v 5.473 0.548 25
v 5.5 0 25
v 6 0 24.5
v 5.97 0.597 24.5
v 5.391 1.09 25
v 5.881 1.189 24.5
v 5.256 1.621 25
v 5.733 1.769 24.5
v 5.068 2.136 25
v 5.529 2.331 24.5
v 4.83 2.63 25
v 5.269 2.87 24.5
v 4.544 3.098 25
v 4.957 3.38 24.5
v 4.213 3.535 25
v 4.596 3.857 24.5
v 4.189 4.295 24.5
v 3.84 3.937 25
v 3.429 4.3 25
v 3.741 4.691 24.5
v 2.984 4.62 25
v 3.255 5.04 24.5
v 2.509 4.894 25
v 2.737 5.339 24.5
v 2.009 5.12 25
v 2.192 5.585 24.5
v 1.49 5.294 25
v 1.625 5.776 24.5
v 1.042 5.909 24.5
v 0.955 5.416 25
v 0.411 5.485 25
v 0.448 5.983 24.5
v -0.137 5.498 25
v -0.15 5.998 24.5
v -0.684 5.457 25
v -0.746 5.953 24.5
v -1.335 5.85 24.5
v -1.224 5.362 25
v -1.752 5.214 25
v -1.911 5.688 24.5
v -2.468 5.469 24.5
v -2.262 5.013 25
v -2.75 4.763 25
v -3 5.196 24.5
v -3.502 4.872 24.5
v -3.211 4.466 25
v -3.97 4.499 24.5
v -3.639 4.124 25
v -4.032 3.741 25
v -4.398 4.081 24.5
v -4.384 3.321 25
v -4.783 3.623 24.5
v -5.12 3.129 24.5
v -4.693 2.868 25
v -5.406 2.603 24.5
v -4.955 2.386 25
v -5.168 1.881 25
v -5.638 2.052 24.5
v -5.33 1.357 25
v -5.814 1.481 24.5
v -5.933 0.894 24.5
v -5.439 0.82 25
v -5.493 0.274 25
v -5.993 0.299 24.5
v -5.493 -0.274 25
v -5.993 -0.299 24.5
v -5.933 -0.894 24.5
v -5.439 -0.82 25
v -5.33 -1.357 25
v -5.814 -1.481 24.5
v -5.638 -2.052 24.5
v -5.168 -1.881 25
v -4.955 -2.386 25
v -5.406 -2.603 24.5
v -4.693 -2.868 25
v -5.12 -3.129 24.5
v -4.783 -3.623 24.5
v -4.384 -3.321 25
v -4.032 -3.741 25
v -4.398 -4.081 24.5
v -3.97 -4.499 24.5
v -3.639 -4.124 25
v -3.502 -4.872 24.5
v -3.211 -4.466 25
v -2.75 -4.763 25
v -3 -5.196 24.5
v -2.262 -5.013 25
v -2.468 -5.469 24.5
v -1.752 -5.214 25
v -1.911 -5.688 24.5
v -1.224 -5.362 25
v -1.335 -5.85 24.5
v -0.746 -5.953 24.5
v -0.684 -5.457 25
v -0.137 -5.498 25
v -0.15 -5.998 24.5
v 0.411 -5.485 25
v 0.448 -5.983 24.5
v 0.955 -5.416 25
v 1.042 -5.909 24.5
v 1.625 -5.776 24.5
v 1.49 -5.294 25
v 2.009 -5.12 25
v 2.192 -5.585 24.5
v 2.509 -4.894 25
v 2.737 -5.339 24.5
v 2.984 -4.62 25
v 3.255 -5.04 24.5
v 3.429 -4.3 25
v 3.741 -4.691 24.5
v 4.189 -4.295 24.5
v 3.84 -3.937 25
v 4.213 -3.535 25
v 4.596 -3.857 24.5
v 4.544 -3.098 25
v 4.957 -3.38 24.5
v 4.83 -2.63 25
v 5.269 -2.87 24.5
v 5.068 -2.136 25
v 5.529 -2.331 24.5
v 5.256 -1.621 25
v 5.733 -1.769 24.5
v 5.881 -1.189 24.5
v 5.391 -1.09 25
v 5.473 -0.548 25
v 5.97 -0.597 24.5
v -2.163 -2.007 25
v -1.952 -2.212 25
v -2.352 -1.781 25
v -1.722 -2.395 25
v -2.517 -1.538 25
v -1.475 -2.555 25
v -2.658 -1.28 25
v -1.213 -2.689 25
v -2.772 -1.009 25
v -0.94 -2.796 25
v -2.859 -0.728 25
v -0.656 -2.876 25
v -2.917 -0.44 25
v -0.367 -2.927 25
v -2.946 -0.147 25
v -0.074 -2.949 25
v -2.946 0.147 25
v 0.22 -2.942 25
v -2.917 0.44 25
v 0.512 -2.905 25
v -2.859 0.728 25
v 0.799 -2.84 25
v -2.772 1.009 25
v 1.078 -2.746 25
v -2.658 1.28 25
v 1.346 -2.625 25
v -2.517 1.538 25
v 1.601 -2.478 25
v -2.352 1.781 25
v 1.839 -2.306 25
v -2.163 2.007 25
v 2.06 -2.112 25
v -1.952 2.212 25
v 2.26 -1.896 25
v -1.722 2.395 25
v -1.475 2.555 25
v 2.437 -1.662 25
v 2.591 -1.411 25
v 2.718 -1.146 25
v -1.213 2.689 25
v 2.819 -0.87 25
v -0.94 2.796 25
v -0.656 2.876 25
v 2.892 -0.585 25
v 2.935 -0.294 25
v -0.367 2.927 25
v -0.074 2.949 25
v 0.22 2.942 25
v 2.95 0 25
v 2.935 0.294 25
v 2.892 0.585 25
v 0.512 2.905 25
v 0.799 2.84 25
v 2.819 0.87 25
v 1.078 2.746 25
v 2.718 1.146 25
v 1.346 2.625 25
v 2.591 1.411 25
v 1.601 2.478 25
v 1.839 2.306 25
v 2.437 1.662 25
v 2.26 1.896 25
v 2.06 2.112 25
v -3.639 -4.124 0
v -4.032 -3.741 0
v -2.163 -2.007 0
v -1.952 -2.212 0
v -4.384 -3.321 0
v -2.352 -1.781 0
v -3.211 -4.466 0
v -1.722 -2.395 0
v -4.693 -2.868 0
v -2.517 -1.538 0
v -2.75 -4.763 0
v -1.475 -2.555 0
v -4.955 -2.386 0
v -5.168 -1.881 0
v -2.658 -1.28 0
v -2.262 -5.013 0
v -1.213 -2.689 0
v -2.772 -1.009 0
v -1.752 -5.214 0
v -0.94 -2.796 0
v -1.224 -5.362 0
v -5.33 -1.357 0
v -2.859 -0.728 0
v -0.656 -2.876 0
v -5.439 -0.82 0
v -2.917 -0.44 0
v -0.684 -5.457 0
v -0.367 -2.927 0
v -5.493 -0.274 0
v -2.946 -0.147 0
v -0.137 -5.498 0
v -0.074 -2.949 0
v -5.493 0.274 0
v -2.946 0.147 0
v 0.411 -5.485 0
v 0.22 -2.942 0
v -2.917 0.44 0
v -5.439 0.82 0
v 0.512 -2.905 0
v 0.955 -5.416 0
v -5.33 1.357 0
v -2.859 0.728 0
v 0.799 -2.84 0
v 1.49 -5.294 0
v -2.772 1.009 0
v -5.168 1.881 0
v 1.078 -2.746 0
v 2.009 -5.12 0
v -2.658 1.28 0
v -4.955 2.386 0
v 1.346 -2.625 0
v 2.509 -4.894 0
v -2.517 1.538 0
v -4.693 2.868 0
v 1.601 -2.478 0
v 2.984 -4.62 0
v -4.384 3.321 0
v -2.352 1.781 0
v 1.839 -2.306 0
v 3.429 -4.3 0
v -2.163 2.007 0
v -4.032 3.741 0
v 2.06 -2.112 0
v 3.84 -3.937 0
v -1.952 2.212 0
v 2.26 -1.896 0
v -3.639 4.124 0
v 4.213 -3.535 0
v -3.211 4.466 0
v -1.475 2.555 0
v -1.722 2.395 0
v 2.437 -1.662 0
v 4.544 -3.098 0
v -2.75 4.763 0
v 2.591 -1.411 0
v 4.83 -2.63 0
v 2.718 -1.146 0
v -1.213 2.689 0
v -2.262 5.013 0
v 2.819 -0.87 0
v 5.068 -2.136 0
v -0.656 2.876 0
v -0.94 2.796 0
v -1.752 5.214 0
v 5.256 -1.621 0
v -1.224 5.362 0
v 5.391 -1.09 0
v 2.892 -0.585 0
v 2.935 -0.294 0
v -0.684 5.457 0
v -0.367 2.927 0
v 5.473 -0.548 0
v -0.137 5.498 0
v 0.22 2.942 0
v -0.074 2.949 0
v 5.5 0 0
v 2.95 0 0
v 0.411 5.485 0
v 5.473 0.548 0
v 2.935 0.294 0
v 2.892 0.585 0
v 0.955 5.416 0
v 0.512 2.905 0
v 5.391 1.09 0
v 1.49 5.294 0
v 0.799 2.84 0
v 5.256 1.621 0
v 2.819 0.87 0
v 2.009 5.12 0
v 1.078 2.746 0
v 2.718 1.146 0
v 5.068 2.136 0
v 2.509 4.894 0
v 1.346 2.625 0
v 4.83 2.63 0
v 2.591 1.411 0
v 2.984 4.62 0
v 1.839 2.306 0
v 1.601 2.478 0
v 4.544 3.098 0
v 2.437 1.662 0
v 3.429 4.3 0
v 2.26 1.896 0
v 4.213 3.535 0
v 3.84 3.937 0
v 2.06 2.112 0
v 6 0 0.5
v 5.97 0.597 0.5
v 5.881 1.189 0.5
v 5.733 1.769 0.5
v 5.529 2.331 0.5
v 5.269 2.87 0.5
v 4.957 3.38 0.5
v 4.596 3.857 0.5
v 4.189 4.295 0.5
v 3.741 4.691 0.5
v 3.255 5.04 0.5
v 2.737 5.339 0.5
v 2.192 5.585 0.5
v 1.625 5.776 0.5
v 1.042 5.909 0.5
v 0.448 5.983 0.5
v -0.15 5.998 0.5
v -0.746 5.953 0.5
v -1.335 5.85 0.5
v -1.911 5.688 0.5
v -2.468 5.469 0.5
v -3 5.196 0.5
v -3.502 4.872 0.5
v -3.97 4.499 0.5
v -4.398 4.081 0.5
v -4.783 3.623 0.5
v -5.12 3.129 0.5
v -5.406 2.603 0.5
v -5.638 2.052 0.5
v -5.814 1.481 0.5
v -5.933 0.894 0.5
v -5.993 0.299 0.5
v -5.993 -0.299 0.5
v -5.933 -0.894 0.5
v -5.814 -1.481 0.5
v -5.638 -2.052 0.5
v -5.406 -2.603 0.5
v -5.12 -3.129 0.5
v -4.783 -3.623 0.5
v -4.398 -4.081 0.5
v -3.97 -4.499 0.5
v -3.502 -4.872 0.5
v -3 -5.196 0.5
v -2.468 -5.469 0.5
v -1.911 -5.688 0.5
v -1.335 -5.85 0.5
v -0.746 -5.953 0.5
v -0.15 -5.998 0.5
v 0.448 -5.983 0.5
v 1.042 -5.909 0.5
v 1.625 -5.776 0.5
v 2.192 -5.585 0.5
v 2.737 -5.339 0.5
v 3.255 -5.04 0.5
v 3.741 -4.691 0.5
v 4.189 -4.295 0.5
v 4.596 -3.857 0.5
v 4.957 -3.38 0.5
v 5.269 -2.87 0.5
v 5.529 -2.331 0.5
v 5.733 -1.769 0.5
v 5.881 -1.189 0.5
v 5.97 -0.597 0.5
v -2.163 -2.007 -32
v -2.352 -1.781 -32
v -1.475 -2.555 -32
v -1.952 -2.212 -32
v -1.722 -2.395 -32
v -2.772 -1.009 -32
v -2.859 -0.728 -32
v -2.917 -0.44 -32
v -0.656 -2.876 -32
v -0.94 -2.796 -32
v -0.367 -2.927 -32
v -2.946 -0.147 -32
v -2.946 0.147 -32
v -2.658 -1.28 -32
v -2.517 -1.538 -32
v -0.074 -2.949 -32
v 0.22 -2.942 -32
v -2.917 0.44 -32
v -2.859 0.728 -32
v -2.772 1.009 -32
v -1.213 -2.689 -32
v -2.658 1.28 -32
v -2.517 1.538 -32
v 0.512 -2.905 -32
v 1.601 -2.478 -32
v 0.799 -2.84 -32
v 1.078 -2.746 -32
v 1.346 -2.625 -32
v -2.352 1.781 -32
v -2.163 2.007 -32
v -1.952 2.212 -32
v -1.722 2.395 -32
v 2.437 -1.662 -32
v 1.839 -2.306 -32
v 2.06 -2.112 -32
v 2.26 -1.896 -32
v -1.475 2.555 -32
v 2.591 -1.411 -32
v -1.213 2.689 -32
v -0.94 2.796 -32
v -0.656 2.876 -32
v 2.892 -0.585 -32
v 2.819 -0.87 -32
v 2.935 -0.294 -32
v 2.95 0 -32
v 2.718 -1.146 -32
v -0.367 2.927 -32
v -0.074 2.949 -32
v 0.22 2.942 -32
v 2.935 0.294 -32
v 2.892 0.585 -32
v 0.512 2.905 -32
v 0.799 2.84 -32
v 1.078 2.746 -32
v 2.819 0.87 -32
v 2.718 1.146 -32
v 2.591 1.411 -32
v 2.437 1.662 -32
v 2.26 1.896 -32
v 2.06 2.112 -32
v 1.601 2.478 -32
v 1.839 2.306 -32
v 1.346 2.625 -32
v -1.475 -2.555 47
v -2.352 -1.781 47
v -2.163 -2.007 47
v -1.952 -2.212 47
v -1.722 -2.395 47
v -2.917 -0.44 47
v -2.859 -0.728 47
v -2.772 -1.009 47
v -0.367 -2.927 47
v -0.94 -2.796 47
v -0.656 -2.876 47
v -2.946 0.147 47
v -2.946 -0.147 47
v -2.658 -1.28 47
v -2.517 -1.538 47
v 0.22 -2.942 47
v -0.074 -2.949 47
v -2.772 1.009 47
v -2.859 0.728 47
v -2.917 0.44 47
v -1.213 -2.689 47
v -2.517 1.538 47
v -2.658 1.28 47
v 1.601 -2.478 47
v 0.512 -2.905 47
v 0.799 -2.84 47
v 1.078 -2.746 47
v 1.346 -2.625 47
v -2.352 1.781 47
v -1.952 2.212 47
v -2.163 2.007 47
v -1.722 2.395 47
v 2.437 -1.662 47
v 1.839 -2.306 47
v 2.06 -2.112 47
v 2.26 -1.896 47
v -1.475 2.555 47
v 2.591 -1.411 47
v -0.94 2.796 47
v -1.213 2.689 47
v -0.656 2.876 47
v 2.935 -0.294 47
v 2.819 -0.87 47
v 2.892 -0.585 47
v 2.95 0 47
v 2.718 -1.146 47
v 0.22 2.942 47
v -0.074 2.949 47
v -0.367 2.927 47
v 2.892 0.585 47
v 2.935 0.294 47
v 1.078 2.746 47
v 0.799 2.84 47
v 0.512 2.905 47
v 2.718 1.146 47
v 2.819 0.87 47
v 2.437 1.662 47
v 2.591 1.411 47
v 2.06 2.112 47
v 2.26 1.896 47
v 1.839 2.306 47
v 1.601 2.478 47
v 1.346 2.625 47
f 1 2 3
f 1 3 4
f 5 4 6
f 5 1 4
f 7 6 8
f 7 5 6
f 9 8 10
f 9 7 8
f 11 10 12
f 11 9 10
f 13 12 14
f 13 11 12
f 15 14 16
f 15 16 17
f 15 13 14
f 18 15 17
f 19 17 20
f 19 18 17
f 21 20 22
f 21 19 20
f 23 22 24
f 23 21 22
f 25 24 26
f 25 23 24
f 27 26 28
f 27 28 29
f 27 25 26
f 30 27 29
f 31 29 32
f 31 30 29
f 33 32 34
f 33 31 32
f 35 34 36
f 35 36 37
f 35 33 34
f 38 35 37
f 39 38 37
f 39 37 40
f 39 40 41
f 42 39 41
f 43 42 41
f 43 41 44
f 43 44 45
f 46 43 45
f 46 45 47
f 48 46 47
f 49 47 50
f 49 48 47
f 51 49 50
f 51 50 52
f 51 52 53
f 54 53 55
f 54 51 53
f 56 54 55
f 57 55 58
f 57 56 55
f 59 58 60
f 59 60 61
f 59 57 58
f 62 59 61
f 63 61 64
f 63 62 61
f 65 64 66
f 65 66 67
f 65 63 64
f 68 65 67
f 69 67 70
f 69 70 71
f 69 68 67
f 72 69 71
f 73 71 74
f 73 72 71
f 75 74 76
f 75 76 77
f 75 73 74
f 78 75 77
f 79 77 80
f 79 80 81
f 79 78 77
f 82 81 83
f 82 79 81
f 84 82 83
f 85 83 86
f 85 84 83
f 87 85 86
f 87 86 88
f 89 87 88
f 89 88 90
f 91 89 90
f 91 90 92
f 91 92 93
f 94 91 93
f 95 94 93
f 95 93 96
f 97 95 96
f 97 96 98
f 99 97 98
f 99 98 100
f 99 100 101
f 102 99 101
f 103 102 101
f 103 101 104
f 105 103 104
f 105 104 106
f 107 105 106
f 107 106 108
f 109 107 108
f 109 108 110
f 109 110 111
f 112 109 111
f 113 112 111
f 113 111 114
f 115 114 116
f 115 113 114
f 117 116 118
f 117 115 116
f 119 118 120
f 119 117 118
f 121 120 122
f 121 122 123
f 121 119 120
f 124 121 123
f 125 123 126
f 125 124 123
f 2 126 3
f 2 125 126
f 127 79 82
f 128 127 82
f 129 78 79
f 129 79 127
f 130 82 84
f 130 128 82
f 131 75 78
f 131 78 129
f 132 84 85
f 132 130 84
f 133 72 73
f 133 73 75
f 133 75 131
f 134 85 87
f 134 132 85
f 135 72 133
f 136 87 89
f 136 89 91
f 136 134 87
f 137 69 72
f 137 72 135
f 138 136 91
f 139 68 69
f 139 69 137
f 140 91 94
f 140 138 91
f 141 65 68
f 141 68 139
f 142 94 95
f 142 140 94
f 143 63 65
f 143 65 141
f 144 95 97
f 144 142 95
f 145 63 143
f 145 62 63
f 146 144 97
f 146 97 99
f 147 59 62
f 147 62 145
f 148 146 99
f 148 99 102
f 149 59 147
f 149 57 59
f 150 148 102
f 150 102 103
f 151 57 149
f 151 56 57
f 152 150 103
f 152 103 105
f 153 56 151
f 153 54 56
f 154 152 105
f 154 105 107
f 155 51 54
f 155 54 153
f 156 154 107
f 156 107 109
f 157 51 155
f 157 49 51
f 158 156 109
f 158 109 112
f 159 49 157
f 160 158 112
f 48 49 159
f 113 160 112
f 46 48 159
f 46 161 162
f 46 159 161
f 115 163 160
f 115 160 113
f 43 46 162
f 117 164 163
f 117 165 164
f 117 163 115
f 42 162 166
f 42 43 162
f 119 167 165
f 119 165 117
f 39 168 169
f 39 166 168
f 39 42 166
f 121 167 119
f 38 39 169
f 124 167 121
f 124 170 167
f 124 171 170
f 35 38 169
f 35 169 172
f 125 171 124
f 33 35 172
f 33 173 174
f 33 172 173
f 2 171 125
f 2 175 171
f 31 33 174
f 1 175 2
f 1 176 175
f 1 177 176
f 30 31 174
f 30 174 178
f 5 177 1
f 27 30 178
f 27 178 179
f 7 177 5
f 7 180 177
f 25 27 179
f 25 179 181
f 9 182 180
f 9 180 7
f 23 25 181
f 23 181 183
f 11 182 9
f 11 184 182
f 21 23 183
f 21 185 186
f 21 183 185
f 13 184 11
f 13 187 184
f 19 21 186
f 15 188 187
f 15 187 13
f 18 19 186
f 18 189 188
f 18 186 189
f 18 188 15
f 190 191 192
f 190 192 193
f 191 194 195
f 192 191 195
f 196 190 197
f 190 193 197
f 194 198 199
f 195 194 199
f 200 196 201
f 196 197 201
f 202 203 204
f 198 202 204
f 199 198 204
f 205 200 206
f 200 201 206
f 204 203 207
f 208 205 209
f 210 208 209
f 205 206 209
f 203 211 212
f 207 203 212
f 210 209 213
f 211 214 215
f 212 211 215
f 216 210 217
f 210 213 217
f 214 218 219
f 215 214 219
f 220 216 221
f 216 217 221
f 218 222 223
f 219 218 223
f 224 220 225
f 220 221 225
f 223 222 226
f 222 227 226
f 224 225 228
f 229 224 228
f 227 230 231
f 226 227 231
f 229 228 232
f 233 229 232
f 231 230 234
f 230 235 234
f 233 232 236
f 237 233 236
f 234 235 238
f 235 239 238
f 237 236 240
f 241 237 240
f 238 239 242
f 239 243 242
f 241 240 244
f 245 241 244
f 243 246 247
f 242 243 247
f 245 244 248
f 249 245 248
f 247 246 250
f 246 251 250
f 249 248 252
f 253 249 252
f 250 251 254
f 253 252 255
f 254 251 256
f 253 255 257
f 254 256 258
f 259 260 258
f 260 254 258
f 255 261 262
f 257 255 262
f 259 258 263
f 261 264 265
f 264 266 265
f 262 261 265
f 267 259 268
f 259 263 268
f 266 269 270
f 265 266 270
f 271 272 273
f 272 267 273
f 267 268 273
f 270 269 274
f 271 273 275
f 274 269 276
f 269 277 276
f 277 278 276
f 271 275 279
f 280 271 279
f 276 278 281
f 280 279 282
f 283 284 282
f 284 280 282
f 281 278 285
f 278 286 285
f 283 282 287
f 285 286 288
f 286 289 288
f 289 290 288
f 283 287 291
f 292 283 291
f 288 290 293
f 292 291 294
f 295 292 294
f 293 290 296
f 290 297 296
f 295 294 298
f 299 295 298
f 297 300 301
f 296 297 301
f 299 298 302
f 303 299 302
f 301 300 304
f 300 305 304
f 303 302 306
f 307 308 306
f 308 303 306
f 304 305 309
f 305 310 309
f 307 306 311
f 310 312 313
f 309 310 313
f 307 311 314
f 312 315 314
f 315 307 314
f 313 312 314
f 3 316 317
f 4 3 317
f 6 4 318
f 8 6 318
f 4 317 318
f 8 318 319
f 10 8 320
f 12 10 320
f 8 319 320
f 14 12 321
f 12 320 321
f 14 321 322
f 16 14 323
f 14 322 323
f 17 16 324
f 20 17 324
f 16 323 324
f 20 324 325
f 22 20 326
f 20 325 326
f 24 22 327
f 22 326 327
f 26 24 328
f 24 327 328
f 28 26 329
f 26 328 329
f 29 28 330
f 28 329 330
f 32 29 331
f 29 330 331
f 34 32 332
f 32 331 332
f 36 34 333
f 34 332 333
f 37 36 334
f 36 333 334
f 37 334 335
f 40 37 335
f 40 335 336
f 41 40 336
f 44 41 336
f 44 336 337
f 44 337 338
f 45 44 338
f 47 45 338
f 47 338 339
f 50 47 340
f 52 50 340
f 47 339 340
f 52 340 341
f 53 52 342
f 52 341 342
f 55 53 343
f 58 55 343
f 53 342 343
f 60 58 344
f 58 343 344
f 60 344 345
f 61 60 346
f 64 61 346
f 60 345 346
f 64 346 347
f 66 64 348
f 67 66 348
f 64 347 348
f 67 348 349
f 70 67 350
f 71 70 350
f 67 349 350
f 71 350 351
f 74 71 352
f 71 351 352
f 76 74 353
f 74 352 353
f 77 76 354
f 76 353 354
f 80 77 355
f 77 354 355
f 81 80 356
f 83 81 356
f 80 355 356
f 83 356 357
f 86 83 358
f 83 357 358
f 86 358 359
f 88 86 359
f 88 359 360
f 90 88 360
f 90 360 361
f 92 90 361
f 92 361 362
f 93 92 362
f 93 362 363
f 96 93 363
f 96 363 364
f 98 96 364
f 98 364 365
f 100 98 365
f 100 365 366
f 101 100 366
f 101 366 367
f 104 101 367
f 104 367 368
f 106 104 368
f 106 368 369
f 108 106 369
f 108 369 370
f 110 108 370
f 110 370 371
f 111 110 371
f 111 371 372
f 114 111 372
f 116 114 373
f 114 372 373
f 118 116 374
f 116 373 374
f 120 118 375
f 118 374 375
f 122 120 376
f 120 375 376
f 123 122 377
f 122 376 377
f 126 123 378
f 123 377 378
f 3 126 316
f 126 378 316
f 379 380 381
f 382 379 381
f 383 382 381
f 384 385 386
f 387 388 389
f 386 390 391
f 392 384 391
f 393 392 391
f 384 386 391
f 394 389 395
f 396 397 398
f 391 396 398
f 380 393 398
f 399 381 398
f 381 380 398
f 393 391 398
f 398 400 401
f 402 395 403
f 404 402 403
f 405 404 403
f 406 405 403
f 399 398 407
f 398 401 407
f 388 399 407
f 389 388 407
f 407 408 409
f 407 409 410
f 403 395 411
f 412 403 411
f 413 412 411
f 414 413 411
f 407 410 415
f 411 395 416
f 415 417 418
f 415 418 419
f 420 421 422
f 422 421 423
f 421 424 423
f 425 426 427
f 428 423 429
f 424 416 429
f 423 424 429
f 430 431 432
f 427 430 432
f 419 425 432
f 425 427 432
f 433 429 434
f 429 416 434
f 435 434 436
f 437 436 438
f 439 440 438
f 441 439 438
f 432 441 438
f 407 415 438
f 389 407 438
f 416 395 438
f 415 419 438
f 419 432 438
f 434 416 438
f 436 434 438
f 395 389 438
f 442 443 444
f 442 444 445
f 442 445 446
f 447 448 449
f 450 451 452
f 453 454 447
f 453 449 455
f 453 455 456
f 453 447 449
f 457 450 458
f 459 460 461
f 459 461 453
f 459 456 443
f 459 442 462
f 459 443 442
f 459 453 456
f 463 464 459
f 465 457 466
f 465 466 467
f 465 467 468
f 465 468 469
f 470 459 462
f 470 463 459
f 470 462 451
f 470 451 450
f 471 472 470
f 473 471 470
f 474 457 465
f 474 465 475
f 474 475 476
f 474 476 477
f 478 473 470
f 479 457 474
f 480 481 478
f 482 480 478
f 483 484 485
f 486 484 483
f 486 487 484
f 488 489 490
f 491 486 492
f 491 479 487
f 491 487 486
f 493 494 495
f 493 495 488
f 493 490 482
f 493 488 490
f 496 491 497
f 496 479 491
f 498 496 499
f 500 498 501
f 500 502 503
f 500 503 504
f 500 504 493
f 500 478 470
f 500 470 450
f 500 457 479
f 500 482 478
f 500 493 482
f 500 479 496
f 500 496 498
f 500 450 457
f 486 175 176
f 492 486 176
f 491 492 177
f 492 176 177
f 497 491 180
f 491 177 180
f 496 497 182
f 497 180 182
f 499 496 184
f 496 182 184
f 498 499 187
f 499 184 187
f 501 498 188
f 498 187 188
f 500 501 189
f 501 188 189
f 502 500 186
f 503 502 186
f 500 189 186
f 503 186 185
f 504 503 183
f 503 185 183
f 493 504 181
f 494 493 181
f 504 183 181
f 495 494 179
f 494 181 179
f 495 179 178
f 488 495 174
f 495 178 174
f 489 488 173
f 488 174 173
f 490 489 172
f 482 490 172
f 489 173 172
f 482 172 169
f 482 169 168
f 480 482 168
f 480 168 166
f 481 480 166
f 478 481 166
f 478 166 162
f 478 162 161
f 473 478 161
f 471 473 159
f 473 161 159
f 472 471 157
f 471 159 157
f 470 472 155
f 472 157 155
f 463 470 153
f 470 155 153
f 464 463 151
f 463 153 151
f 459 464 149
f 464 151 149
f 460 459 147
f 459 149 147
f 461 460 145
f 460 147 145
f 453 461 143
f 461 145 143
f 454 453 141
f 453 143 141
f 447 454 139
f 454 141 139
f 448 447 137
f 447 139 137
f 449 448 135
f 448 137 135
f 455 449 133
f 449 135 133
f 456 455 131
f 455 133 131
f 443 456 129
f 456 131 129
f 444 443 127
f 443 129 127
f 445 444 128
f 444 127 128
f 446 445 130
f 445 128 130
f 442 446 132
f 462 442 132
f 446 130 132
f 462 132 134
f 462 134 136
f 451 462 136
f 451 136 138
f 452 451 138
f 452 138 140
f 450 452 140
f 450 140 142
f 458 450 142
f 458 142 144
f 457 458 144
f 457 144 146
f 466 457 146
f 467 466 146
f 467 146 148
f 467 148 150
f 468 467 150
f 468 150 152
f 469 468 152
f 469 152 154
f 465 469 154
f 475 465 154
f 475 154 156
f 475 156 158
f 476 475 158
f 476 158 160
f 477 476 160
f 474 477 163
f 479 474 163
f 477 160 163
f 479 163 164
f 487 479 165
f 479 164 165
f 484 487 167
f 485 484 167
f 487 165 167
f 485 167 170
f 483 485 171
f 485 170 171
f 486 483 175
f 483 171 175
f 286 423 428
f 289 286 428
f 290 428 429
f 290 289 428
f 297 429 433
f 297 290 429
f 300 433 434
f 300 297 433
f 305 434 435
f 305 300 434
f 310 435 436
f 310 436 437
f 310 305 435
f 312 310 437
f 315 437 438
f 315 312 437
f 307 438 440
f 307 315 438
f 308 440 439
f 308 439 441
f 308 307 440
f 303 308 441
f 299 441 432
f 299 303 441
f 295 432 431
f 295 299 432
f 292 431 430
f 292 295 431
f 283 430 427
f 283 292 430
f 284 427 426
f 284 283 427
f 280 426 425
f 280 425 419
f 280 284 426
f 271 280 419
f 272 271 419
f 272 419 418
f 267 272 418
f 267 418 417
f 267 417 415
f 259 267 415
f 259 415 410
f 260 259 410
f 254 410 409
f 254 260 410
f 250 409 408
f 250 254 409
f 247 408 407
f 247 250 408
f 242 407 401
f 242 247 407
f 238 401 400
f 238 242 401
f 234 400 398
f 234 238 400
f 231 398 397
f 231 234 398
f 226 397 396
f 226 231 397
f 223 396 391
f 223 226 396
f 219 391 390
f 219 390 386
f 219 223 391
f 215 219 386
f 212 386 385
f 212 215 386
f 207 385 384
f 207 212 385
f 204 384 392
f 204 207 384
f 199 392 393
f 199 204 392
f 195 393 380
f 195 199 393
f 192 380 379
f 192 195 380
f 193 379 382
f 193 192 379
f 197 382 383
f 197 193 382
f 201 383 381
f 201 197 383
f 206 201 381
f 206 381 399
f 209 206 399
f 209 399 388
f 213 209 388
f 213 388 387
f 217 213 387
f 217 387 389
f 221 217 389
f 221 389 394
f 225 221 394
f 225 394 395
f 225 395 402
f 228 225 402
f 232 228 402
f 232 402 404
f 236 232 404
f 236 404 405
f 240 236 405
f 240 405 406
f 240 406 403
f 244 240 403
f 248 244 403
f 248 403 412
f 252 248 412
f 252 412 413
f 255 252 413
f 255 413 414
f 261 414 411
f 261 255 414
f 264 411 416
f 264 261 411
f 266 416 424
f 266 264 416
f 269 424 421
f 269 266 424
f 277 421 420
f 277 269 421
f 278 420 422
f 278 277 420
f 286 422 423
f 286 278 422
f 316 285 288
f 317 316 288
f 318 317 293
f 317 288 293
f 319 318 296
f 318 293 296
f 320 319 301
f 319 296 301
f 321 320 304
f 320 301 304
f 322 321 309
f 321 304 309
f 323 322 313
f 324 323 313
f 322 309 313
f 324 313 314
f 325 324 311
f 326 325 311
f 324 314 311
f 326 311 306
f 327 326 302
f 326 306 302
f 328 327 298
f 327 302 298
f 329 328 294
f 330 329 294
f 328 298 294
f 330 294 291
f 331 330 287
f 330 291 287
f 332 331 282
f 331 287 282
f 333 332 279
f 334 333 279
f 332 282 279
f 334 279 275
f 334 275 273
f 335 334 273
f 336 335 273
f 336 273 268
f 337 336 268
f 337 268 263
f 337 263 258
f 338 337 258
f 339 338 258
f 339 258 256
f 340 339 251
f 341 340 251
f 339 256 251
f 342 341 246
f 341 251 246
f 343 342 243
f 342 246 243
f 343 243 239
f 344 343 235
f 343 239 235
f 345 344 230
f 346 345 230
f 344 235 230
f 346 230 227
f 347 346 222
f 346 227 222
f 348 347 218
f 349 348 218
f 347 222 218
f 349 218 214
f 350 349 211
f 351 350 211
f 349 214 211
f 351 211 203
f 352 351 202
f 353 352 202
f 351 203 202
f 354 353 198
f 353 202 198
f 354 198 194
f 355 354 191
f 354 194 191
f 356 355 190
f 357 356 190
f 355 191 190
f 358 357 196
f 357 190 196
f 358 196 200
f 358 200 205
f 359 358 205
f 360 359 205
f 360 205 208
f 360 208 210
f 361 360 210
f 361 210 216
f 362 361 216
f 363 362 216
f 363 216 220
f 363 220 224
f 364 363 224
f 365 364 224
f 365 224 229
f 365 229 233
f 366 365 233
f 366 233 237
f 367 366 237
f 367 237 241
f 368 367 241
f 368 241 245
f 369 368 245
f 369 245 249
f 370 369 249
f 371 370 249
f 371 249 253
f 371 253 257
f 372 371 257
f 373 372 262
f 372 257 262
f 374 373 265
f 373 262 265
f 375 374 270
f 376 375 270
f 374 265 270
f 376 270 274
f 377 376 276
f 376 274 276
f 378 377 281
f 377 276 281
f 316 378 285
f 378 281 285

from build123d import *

# Parameters (mm, degrees)
F0_R     = 2.95
F3_DEPTH = 32
F0_R_2   = 6
F4_DEPTH = 25
F2_R     = 2.95
F5_DEPTH = 22
F6_SIZE  = 0.5


with BuildPart() as f3:
    # F0 (on Top) → F3 (new body)
    with BuildSketch(Plane.XY):
        Circle(F0_R)
    extrude(amount=-F3_DEPTH)

    # F0 (on Top) → F4 (join)
    with BuildSketch(Plane.XY):
        Circle(F0_R_2)
        Circle(F0_R, mode=Mode.SUBTRACT)
        Circle(F0_R)
    extrude(amount=F4_DEPTH)

    # F2 (on offset) → F5 (join)
    with BuildSketch(Plane.XY.offset(25)):
        Circle(F2_R)
    extrude(amount=F5_DEPTH)

    # F6
    f6_edges = [f3.edges().sort_by_distance(p)[0] for p in [
        (-6, 0, 25),
        (-6, 0, 0),
    ]]
    chamfer(f6_edges, length=F6_SIZE)


solid = f3.part
